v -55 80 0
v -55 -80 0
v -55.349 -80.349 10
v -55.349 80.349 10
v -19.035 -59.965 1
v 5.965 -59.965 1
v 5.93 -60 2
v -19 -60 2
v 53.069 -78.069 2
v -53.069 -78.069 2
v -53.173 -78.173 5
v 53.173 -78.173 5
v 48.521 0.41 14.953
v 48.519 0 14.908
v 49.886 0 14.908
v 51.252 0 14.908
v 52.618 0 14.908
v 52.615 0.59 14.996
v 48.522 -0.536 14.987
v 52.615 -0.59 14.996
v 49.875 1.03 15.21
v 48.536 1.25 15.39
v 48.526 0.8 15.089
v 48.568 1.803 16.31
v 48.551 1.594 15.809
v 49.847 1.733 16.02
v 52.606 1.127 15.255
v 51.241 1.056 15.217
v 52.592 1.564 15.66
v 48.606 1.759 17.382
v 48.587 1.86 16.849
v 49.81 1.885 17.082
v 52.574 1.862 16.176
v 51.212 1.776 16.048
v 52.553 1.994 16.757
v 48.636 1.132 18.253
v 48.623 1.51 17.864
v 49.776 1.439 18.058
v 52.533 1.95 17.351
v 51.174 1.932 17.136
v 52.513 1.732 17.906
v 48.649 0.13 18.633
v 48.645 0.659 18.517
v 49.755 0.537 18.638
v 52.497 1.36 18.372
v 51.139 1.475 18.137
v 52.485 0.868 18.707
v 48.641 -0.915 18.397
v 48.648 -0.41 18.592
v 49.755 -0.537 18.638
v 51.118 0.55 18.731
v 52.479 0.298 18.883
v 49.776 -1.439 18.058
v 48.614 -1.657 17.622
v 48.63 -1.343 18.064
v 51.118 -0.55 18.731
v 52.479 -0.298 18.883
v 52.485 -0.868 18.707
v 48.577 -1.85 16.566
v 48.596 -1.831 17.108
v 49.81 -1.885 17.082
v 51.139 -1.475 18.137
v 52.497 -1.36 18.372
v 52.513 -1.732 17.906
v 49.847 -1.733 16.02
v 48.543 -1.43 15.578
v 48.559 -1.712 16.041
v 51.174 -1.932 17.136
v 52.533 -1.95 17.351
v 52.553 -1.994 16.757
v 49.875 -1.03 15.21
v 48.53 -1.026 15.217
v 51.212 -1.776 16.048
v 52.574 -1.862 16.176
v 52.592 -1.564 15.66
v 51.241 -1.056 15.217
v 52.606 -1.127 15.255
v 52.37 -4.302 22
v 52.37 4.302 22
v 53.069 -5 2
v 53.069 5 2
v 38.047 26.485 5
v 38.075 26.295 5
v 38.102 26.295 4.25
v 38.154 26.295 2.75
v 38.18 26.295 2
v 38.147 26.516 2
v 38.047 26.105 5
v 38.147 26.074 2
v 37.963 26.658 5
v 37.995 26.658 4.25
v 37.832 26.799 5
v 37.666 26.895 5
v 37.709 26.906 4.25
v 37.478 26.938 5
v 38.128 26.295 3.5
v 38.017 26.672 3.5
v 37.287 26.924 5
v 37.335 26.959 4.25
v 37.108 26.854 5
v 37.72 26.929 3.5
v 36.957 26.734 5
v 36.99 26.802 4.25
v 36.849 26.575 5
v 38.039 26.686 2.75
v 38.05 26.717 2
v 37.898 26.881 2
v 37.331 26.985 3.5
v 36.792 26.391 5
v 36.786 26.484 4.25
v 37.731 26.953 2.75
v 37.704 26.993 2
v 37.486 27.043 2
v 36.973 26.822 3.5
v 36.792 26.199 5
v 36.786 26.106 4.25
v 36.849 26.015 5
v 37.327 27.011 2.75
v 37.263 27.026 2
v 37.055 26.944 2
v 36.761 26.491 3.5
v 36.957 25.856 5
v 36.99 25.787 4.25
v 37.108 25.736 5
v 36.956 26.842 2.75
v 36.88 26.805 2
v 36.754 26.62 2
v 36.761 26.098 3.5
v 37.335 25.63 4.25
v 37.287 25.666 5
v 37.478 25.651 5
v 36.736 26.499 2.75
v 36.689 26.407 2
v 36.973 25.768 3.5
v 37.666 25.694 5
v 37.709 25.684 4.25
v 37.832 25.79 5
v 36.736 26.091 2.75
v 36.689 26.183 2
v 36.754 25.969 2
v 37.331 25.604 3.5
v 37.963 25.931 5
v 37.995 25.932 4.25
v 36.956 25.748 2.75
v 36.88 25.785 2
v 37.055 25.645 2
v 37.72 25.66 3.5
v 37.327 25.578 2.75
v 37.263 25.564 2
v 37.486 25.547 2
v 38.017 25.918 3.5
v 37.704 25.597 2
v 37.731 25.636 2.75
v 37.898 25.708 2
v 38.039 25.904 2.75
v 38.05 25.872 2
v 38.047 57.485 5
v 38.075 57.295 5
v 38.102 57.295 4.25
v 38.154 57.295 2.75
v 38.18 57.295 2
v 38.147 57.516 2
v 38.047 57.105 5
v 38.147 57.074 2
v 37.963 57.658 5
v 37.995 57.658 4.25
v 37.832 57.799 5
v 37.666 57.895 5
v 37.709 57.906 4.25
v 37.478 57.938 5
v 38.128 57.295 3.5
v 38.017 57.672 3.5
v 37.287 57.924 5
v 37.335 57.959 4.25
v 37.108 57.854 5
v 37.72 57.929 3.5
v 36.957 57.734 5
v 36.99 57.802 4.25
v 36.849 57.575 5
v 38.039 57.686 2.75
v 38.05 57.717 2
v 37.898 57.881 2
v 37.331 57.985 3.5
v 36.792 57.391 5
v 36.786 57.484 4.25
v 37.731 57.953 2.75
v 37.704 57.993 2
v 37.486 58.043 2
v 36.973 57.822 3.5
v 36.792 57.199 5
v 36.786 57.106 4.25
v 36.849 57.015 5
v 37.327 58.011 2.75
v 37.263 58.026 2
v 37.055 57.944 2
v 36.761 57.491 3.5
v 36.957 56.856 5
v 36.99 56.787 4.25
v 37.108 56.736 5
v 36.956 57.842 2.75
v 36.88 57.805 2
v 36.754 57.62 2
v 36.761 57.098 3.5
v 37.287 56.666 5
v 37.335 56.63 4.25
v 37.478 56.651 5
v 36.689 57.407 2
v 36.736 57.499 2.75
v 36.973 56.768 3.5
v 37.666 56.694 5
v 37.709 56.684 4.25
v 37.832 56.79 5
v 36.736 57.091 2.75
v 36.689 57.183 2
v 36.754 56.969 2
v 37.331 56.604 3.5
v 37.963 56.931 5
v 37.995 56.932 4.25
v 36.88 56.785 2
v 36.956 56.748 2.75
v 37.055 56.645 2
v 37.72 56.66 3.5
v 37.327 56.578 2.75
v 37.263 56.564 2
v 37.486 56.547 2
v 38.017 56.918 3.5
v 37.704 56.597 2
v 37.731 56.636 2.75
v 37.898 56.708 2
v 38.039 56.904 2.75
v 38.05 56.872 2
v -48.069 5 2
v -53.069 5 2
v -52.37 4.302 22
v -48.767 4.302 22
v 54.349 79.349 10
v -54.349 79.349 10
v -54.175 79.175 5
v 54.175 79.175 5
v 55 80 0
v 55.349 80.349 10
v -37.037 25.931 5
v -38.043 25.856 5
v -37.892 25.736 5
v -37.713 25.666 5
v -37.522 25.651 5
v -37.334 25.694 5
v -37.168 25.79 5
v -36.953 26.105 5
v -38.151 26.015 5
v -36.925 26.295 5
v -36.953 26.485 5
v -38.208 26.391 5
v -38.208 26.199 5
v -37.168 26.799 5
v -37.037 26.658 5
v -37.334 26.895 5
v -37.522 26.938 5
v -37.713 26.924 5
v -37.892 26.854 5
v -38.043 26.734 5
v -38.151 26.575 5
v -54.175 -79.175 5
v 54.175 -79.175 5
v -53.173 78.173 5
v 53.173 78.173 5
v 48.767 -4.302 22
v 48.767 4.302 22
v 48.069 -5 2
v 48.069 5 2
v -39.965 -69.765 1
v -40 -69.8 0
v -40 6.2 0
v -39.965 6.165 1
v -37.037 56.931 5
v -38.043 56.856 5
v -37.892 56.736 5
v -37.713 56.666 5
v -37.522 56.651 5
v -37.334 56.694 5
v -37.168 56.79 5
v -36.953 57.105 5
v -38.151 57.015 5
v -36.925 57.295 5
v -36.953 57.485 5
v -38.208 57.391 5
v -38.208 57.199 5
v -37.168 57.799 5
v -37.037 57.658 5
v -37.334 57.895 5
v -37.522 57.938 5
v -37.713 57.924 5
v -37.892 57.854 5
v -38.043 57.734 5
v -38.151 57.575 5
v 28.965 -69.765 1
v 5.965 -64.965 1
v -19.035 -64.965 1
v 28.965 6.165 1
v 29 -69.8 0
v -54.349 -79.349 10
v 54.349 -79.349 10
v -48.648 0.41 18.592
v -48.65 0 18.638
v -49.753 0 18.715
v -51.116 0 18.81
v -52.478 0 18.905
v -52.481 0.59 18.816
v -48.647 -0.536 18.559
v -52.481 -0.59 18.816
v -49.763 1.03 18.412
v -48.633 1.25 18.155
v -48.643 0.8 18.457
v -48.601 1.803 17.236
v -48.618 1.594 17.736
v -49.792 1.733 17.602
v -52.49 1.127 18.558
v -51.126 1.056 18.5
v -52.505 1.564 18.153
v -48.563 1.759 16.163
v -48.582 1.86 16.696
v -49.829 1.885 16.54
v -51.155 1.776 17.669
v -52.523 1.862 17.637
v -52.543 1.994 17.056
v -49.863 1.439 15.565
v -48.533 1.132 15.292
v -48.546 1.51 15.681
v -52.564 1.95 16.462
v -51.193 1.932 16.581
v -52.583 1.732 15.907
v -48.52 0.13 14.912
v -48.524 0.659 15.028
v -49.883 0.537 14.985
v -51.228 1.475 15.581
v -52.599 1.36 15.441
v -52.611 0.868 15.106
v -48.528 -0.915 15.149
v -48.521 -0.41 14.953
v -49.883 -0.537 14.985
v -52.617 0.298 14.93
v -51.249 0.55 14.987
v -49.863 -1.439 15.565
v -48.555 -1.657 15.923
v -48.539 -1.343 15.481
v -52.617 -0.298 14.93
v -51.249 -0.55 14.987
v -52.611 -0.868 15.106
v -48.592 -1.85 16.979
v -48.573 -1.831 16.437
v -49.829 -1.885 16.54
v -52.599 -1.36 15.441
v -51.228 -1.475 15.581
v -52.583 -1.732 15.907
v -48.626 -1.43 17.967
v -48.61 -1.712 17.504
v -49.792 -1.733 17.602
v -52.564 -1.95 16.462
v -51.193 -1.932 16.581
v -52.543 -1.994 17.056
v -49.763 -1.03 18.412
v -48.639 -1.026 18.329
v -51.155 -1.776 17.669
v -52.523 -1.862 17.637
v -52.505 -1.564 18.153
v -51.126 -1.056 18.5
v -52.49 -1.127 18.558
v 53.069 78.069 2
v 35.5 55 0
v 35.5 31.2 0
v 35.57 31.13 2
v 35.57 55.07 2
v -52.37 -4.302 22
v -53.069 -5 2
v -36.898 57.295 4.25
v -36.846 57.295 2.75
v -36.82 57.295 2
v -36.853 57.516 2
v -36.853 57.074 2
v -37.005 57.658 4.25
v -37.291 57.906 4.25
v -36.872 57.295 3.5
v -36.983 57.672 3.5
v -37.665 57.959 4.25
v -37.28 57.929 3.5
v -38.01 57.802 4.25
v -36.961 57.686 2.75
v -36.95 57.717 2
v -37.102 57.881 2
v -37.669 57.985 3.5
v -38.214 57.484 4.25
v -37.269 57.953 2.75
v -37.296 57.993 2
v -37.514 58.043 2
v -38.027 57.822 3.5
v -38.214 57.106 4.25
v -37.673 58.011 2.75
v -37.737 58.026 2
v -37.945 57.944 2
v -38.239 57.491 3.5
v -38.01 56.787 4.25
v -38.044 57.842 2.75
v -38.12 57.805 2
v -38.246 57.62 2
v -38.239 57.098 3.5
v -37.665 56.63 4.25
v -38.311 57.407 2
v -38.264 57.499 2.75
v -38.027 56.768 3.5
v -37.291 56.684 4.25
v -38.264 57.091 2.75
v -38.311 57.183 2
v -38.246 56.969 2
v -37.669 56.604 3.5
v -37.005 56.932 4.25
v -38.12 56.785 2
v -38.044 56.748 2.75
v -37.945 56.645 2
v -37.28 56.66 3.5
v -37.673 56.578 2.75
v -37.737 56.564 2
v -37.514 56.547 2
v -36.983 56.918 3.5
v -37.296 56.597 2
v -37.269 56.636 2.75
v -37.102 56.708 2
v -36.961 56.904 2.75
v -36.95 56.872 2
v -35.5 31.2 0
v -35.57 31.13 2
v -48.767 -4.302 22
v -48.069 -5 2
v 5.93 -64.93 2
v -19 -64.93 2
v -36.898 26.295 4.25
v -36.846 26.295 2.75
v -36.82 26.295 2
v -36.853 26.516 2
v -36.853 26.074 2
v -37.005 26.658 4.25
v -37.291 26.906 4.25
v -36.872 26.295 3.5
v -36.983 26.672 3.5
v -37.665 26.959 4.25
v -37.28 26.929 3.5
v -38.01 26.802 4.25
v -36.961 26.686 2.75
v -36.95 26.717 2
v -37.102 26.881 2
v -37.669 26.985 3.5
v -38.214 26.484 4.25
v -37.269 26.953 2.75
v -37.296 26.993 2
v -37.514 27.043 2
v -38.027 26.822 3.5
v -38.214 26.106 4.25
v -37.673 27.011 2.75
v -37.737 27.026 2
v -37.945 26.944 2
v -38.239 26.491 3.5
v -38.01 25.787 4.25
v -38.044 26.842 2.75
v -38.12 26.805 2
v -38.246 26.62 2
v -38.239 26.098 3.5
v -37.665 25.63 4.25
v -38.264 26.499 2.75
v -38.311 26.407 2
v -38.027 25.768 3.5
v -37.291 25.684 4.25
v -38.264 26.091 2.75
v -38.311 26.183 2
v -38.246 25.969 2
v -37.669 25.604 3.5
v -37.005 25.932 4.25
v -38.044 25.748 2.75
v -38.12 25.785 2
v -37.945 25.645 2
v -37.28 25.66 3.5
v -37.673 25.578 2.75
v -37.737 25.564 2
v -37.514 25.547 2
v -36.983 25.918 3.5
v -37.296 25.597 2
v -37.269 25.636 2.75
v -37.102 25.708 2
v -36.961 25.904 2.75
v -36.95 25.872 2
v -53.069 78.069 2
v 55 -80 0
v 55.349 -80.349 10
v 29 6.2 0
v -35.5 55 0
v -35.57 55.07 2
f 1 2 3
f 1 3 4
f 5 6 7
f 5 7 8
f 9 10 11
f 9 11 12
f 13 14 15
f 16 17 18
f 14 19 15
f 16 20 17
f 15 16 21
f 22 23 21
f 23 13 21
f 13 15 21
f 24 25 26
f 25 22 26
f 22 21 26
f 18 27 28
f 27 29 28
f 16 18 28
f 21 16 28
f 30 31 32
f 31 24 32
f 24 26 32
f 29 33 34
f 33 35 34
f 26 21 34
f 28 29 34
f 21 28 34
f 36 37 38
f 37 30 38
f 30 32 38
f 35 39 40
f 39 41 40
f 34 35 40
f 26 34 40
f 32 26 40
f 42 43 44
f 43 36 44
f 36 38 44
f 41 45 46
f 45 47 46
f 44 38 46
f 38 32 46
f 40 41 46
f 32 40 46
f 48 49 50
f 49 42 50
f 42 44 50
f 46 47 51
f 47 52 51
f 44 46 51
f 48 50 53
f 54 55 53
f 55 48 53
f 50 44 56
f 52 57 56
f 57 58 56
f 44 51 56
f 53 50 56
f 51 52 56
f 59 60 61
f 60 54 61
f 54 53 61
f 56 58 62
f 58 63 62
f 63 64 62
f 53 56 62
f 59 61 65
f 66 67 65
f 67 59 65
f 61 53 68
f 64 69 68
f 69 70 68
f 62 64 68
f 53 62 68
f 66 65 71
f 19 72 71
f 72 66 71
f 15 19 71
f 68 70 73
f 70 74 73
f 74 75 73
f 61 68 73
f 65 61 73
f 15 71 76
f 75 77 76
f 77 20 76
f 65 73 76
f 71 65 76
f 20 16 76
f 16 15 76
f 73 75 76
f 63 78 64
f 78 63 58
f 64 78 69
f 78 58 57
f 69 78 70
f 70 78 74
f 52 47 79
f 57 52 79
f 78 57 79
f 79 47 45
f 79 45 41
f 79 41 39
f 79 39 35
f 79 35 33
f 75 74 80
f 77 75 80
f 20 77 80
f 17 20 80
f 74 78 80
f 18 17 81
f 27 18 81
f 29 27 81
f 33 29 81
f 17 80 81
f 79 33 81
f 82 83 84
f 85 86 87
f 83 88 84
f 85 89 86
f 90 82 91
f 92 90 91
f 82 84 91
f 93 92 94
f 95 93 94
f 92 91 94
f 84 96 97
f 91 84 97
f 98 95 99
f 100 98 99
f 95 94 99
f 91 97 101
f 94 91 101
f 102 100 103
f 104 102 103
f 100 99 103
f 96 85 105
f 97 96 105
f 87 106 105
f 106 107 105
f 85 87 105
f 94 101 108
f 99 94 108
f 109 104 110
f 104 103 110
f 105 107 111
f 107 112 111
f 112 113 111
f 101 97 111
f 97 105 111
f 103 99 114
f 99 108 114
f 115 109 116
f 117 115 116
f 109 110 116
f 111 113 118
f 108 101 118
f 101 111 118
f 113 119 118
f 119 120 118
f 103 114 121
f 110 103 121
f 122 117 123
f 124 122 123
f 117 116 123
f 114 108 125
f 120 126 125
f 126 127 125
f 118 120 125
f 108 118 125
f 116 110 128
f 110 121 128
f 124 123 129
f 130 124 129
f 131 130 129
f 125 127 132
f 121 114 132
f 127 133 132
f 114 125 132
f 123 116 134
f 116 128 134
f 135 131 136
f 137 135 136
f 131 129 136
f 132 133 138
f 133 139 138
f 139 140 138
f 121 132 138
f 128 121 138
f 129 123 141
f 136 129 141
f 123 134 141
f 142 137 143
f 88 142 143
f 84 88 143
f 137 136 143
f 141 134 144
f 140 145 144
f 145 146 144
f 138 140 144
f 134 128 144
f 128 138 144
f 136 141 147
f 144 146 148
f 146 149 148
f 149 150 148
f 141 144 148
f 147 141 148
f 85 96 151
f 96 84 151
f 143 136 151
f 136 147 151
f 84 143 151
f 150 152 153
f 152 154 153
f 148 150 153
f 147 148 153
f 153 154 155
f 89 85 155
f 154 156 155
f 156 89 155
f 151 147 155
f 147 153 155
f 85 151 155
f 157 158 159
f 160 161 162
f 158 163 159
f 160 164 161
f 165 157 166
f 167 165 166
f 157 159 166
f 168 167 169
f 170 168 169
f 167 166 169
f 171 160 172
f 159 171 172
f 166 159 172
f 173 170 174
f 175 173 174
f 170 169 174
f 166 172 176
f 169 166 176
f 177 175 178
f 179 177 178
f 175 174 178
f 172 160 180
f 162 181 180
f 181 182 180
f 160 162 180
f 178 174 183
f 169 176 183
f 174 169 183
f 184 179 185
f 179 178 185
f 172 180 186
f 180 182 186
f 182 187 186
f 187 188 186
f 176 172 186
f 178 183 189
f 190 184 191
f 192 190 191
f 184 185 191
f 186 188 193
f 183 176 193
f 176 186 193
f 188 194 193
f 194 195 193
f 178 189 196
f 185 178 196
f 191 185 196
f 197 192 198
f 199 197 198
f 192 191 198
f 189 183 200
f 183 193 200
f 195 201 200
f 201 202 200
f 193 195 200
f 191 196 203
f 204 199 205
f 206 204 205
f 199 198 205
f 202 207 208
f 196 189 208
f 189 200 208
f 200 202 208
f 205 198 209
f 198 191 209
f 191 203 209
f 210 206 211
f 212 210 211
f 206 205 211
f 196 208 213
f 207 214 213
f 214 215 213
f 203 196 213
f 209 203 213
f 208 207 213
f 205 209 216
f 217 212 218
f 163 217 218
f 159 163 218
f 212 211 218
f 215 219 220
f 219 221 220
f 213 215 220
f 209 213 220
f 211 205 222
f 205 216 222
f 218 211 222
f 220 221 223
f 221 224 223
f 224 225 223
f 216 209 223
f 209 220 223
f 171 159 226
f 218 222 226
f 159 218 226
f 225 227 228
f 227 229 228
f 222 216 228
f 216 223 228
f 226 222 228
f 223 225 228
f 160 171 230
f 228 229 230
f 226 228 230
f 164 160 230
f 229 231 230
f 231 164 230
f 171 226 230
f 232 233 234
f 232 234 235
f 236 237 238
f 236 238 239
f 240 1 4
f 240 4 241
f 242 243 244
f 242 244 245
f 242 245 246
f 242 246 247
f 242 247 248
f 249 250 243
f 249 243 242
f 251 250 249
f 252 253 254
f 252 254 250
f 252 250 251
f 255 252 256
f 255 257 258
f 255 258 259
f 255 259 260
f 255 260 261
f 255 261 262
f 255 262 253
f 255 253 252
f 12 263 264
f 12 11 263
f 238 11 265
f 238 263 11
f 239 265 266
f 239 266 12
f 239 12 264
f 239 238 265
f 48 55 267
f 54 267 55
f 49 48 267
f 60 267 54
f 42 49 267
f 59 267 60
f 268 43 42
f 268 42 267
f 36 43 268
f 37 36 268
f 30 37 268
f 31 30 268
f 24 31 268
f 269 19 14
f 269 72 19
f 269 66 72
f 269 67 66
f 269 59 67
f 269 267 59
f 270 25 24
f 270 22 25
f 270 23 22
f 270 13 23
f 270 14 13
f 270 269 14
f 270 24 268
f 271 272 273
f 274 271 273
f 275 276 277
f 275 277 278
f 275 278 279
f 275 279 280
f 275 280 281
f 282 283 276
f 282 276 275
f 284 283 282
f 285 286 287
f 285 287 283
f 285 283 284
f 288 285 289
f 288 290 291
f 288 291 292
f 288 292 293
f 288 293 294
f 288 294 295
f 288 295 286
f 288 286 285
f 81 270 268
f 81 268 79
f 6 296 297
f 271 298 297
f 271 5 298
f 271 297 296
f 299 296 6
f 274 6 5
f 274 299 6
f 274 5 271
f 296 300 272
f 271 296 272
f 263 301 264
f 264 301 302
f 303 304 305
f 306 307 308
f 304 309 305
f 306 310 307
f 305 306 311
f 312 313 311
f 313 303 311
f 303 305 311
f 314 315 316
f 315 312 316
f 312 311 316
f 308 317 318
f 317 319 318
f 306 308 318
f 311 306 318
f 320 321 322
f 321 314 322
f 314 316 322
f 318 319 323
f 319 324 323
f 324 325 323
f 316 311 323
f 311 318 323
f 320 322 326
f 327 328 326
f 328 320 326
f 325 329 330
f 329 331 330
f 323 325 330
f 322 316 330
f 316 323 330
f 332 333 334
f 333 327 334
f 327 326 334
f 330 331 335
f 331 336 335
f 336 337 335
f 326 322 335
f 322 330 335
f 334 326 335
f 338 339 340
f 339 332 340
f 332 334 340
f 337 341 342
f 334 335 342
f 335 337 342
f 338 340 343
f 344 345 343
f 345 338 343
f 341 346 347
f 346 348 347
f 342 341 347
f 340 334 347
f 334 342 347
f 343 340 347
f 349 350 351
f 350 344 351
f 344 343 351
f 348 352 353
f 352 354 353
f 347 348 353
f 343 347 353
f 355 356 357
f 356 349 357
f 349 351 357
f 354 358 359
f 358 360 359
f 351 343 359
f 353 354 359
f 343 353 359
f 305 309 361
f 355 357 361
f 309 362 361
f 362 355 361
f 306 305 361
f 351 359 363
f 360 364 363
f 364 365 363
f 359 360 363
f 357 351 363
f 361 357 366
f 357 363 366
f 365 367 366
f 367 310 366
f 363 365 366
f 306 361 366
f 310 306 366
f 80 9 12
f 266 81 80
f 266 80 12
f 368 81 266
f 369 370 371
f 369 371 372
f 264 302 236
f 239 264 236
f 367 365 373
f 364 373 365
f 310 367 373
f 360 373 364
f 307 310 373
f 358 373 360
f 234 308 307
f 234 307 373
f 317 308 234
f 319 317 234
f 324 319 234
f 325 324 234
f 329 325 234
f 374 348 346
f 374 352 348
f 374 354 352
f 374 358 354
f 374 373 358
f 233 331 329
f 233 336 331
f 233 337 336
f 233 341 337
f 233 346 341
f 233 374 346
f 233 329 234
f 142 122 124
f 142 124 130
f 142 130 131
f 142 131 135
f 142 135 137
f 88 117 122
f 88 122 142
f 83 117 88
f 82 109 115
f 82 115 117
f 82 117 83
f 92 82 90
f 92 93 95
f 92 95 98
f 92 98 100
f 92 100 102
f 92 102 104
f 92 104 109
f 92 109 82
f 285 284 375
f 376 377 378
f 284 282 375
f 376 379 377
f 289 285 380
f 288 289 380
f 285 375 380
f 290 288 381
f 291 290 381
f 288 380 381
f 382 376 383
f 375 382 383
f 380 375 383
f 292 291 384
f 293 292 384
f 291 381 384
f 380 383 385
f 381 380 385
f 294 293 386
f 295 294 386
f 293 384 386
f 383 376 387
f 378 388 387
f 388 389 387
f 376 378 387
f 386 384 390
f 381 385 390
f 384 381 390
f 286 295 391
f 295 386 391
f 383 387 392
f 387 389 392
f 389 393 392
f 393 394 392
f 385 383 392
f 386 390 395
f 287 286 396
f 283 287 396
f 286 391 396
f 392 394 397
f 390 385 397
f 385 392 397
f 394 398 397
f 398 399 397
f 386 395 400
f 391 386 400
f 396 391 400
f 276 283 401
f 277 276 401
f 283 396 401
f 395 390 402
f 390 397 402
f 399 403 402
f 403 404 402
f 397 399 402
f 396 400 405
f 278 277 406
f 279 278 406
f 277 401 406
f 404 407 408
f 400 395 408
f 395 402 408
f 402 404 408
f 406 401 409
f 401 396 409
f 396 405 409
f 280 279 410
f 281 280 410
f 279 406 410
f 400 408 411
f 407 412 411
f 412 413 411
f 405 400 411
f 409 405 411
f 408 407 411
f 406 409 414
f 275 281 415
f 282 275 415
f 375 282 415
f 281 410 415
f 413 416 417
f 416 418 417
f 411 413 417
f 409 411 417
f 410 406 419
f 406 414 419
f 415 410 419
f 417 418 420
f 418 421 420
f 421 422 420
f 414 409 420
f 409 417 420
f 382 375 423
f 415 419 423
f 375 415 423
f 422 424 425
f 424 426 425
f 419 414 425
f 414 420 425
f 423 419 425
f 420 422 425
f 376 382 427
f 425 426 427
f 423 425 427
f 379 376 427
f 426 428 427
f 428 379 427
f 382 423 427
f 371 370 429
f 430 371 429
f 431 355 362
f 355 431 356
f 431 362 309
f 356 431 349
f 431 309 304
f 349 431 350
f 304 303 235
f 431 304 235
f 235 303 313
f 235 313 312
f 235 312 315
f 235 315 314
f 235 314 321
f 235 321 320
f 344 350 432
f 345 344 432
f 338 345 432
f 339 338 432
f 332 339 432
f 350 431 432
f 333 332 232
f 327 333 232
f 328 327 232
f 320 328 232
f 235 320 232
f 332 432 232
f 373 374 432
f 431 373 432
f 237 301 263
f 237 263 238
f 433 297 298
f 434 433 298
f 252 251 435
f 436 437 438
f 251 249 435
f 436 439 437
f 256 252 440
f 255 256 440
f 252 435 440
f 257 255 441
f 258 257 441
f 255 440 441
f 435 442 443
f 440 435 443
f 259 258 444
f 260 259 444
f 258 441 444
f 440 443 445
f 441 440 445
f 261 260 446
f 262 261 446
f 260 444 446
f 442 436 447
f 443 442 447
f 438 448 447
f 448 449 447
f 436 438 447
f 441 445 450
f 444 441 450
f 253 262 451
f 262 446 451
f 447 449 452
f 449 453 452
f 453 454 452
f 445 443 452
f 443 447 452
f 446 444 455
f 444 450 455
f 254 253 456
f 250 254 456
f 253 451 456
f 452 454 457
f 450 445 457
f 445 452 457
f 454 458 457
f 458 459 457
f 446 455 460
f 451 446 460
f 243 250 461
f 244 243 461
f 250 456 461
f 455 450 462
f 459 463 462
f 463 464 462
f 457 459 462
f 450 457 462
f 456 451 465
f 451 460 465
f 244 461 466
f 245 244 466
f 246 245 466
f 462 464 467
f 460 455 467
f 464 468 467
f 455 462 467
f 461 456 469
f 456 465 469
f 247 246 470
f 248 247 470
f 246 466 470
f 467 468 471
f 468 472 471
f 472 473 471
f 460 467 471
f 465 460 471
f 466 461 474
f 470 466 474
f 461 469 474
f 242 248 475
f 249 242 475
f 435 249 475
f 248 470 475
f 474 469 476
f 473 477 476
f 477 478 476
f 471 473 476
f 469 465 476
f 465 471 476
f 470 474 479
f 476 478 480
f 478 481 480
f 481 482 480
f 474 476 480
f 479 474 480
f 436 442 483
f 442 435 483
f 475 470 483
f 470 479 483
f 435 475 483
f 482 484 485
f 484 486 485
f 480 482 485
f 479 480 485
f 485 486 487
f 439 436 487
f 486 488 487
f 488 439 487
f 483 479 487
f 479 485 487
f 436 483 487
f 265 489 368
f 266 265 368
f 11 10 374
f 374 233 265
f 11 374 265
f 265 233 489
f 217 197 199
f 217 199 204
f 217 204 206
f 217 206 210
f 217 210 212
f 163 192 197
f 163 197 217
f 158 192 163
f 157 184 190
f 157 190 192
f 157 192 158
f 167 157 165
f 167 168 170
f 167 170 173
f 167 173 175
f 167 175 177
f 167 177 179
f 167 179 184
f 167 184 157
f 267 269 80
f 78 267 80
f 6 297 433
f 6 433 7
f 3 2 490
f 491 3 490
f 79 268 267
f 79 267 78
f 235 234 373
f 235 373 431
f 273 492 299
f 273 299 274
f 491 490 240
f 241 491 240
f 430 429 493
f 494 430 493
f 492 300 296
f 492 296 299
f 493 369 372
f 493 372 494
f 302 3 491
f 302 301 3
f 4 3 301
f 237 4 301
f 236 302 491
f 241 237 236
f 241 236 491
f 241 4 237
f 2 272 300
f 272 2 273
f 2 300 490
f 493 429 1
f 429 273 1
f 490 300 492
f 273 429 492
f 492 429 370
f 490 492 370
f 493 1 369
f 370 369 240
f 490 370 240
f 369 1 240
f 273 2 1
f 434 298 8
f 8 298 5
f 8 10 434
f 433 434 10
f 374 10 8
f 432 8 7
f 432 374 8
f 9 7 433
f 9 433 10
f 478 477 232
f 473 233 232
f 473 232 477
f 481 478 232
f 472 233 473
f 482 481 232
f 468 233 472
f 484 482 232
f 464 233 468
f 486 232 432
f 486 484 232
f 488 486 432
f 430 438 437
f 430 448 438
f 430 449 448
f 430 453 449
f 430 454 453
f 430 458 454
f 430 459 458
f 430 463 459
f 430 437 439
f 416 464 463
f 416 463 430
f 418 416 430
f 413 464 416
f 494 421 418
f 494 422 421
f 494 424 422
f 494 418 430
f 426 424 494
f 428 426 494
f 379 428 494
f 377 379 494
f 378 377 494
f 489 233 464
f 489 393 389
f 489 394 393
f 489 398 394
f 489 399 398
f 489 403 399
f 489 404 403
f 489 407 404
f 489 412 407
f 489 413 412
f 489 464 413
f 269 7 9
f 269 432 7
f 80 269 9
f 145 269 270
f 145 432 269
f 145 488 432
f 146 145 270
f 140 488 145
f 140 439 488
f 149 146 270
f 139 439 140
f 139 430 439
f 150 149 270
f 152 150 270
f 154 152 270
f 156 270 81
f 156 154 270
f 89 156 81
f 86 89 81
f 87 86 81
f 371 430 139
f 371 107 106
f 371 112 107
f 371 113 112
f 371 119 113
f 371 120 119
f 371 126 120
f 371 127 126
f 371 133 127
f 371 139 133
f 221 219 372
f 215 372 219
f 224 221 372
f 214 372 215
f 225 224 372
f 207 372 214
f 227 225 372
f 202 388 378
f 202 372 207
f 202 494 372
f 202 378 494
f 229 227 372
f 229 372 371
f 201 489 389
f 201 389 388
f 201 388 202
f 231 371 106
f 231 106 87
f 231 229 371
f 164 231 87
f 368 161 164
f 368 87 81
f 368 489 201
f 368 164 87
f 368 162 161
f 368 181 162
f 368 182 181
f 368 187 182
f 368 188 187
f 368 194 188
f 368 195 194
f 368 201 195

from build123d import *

# Parameters (mm, degrees)
SKETCH1_W                     = 110
SKETCH1_H                     = 160
BOSS_EXTRUDE1_DEPTH           = 10
BOSS_EXTRUDE1_DRAFT           = -2
SHELL1_T                      = -2
SKETCH3_W                     = 108.69841539
SKETCH3_H                     = 158.69841539
CUT_EXTRUDE3_DEPTH            = 5
CUT_EXTRUDE3_DRAFT            = -2
SKETCH4_W                     = 71
SKETCH4_H                     = 23.8
CUT_EXTRUDE4_DEPTH            = 2
CUT_EXTRUDE4_DRAFT            = 2
SKETCH10_R                    = 0.75
BOSS_EXTRUDE3_DEPTH           = 3
BOSS_EXTRUDE3_DRAFT           = 2
BOSS_EXTRUDE3_PROFILE_2_DEPTH = 3
BOSS_EXTRUDE3_PROFILE_2_DRAFT = 2
BOSS_EXTRUDE3_PROFILE_3_DEPTH = 3
BOSS_EXTRUDE3_PROFILE_3_DRAFT = 2
BOSS_EXTRUDE3_PROFILE_4_DEPTH = 3
BOSS_EXTRUDE3_PROFILE_4_DRAFT = 2
SKETCH13_W                    = 5
SKETCH13_H                    = 10
BOSS_EXTRUDE8_DEPTH           = 20
BOSS_EXTRUDE8_DRAFT           = 2
BOSS_EXTRUDE8_PROFILE_2_DEPTH = 20
BOSS_EXTRUDE8_PROFILE_2_DRAFT = 2
CUT_EXTRUDE8_REACH            = 138.446
SKETCH21_R                    = 2
CUT_EXTRUDE8_DRAFT            = -2
CUT_EXTRUDE9_REACH            = 138.446
SKETCH22_R                    = 2
CUT_EXTRUDE9_DRAFT            = -2
SKETCH27_W                    = 69
SKETCH27_H                    = 76
CUT_EXTRUDE10_DEPTH           = 1
CUT_EXTRUDE10_DRAFT           = -2
SKETCH28_W                    = 25
SKETCH28_H                    = 5
CUT_EXTRUDE11_DEPTH           = 1
CUT_EXTRUDE11_DRAFT           = -2


with BuildPart() as part:
    # Sketch1 → Boss-Extrude1 (with draft: the straight prism first)
    with BuildSketch(Plane.XY):
        Rectangle(SKETCH1_W, SKETCH1_H)
    extrude(amount=BOSS_EXTRUDE1_DEPTH)
    # Boss-Extrude1: the draft: its side faces are tilted about the plane it starts from
    boss_extrude1_sides = [part.faces().sort_by_distance(p)[0] for p in [
        (55, 0, 5),
        (0, 80, 5),
        (-55, 0, 5),
        (0, -80, 5),
    ]]
    draft(boss_extrude1_sides, Plane.XY, BOSS_EXTRUDE1_DRAFT)

    # Shell1
    shell1_openings = [part.faces().sort_by_distance(p)[0] for p in [
        (0, 0, 10),
    ]]
    offset(amount=SHELL1_T, openings=shell1_openings, kind=Kind.INTERSECTION)


with BuildPart() as cut_extrude3_tool:
    # Sketch3 → Cut-Extrude3 (with draft: the straight prism first)
    with BuildSketch(Plane.XY.offset(10)):
        Rectangle(SKETCH3_W, SKETCH3_H)
    extrude(amount=-CUT_EXTRUDE3_DEPTH)
    # Cut-Extrude3: the draft: its side faces are tilted about the plane it starts from
    cut_extrude3_sides = [cut_extrude3_tool.faces().sort_by_distance(p)[0] for p in [
        (54.349207695, 0, 7.5),
        (0, 79.349207695, 7.5),
        (-54.349207695, 0, 7.5),
        (0, -79.349207695, 7.5),
    ]]
    draft(cut_extrude3_sides, Plane.XY.offset(10), CUT_EXTRUDE3_DRAFT)


with BuildPart() as part_1:
    add(part.part)

    # Cut-Extrude3: cut by cut_extrude3_tool
    add(cut_extrude3_tool.part, mode=Mode.SUBTRACT)


with BuildPart() as cut_extrude4_tool:
    # Sketch4 → Cut-Extrude4 (with draft: the straight prism first)
    with BuildSketch(Plane(origin=(0, 0, 0), x_dir=(-1, 0, 0), z_dir=(0, 0, -1))):
        with Locations((0, 43.1)):
            Rectangle(SKETCH4_W, SKETCH4_H)
    extrude(amount=-CUT_EXTRUDE4_DEPTH)
    # Cut-Extrude4: the draft: its side faces are tilted about the plane it starts from
    cut_extrude4_sides = [cut_extrude4_tool.faces().sort_by_distance(p)[0] for p in [
        (-35.5, 43.1, 1),
        (0, 55, 1),
        (35.5, 43.1, 1),
        (0, 31.2, 1),
    ]]
    draft(cut_extrude4_sides, Plane(origin=(0, 0, 0), x_dir=(-1, 0, 0), z_dir=(0, 0, -1)), CUT_EXTRUDE4_DRAFT)


with BuildPart() as part_2:
    add(part_1.part)

    # Cut-Extrude4: cut by cut_extrude4_tool
    add(cut_extrude4_tool.part, mode=Mode.SUBTRACT)


with BuildPart() as boss_extrude3_tool:
    # Sketch10 → Boss-Extrude3 (with draft: the straight prism first)
    with BuildSketch(Plane.XY.offset(2)):
        with Locations((-37.569841539, 57.294841539)):
            Circle(SKETCH10_R)
    extrude(amount=BOSS_EXTRUDE3_DEPTH)
    # Boss-Extrude3: the draft: its side faces are tilted about the plane it starts from
    boss_extrude3_sides = [boss_extrude3_tool.faces().sort_by_distance(p)[0] for p in [
        (-38.319841539, 57.294841539, 3.5),
    ]]
    draft(boss_extrude3_sides, Plane.XY.offset(2), BOSS_EXTRUDE3_DRAFT)


with BuildPart() as part_3:
    add(part_2.part)

    # Boss-Extrude3: add boss_extrude3_tool
    add(boss_extrude3_tool.part)


with BuildPart() as boss_extrude3_profile_2_tool:
    # Sketch10 → Boss-Extrude3 profile 2 (with draft: the straight prism first)
    with BuildSketch(Plane.XY.offset(2)):
        with Locations((37.430158461, 57.294841539)):
            Circle(SKETCH10_R)
    extrude(amount=BOSS_EXTRUDE3_PROFILE_2_DEPTH)
    # Boss-Extrude3 profile 2: the draft: its side faces are tilted about the plane it starts from
    boss_extrude3_profile_2_sides = [boss_extrude3_profile_2_tool.faces().sort_by_distance(p)[0] for p in [
        (36.680158461, 57.294841539, 3.5),
    ]]
    draft(boss_extrude3_profile_2_sides, Plane.XY.offset(2), BOSS_EXTRUDE3_PROFILE_2_DRAFT)


with BuildPart() as part_4:
    add(part_3.part)

    # Boss-Extrude3 profile 2: add boss_extrude3_profile_2_tool
    add(boss_extrude3_profile_2_tool.part)


with BuildPart() as boss_extrude3_profile_3_tool:
    # Sketch10 → Boss-Extrude3 profile 3 (with draft: the straight prism first)
    with BuildSketch(Plane.XY.offset(2)):
        with Locations((37.430158461, 26.294841539)):
            Circle(SKETCH10_R)
    extrude(amount=BOSS_EXTRUDE3_PROFILE_3_DEPTH)
    # Boss-Extrude3 profile 3: the draft: its side faces are tilted about the plane it starts from
    boss_extrude3_profile_3_sides = [boss_extrude3_profile_3_tool.faces().sort_by_distance(p)[0] for p in [
        (36.680158461, 26.294841539, 3.5),
    ]]
    draft(boss_extrude3_profile_3_sides, Plane.XY.offset(2), BOSS_EXTRUDE3_PROFILE_3_DRAFT)


with BuildPart() as part_5:
    add(part_4.part)

    # Boss-Extrude3 profile 3: add boss_extrude3_profile_3_tool
    add(boss_extrude3_profile_3_tool.part)


with BuildPart() as boss_extrude3_profile_4_tool:
    # Sketch10 → Boss-Extrude3 profile 4 (with draft: the straight prism first)
    with BuildSketch(Plane.XY.offset(2)):
        with Locations((-37.569841539, 26.294841539)):
            Circle(SKETCH10_R)
    extrude(amount=BOSS_EXTRUDE3_PROFILE_4_DEPTH)
    # Boss-Extrude3 profile 4: the draft: its side faces are tilted about the plane it starts from
    boss_extrude3_profile_4_sides = [boss_extrude3_profile_4_tool.faces().sort_by_distance(p)[0] for p in [
        (-38.319841539, 26.294841539, 3.5),
    ]]
    draft(boss_extrude3_profile_4_sides, Plane.XY.offset(2), BOSS_EXTRUDE3_PROFILE_4_DRAFT)


with BuildPart() as part_6:
    add(part_5.part)

    # Boss-Extrude3 profile 4: add boss_extrude3_profile_4_tool
    add(boss_extrude3_profile_4_tool.part)


with BuildPart() as boss_extrude8_tool:
    # Sketch13 → Boss-Extrude8 (with draft: the straight prism first)
    with BuildSketch(Plane.XY.offset(2)):
        with Locations((-50.56862245, 0)):
            Rectangle(SKETCH13_W, SKETCH13_H)
    extrude(amount=BOSS_EXTRUDE8_DEPTH)
    # Boss-Extrude8: the draft: its side faces are tilted about the plane it starts from
    boss_extrude8_sides = [boss_extrude8_tool.faces().sort_by_distance(p)[0] for p in [
        (-50.56862245, 5, 12),
        (-53.06862245, 0, 12),
        (-50.56862245, -5, 12),
        (-48.06862245, 0, 12),
    ]]
    draft(boss_extrude8_sides, Plane.XY.offset(2), BOSS_EXTRUDE8_DRAFT)


with BuildPart() as part_7:
    add(part_6.part)

    # Boss-Extrude8: add boss_extrude8_tool
    add(boss_extrude8_tool.part)


with BuildPart() as boss_extrude8_profile_2_tool:
    # Sketch13 → Boss-Extrude8 profile 2 (with draft: the straight prism first)
    with BuildSketch(Plane.XY.offset(2)):
        with Locations((50.56862245, 0)):
            Rectangle(SKETCH13_W, SKETCH13_H)
    extrude(amount=BOSS_EXTRUDE8_PROFILE_2_DEPTH)
    # Boss-Extrude8 profile 2: the draft: its side faces are tilted about the plane it starts from
    boss_extrude8_profile_2_sides = [boss_extrude8_profile_2_tool.faces().sort_by_distance(p)[0] for p in [
        (50.56862245, -5, 12),
        (53.06862245, 0, 12),
        (50.56862245, 5, 12),
        (48.06862245, 0, 12),
    ]]
    draft(boss_extrude8_profile_2_sides, Plane.XY.offset(2), BOSS_EXTRUDE8_PROFILE_2_DRAFT)


with BuildPart() as part_8:
    add(part_7.part)

    # Boss-Extrude8 profile 2: add boss_extrude8_profile_2_tool
    add(boss_extrude8_profile_2_tool.part)

    # Cut-Extrude8: up to this plane
    cut_extrude8_end = Plane(origin=(-48.06862245, 5, 2), z_dir=(0.9993908270190958, 0, 0.034899496702501004))



with BuildPart() as cut_extrude8_long_prism_1:
    # Sketch21 → Cut-Extrude8 (the long prism of profile 1, to be tilted and cut off)
    with BuildSketch(Plane(origin=(-53.073742676, 0, 1.853375934), x_dir=(0.03489949670250101, 0, 0.9993908270190958), z_dir=(-0.9993908270190958, 0, 0.03489949670250101))):
        with Locations((15.062248779, 0)):
            Circle(SKETCH21_R)
    extrude(amount=-CUT_EXTRUDE8_REACH)
    cut_extrude8_tool1_sides = [cut_extrude8_long_prism_1.faces().sort_by_distance(p)[0] for p in [
        (16.562954451, 0, 12.491819684),
    ]]
    draft(cut_extrude8_tool1_sides, Plane(origin=(-53.073742676, 0, 1.853375934), x_dir=(0.03489949670250101, 0, 0.9993908270190958), z_dir=(-0.9993908270190958, 0, 0.03489949670250101)), CUT_EXTRUDE8_DRAFT)  # the draft: side faces tilted about the start plane


with BuildPart() as part_9:
    add(part_8.part)
    cut_extrude8_tool1 = split(cut_extrude8_long_prism_1.part, bisect_by=cut_extrude8_end, keep=Keep.BOTH, mode=Mode.PRIVATE)
    add(cut_extrude8_tool1.solids().sort_by_distance((-52.548078, 0, 16.906449))[0], mode=Mode.SUBTRACT)

    # Cut-Extrude9: up to this plane
    cut_extrude9_end = Plane(origin=(48.06862245, -5, 2), z_dir=(-0.9993908270190958, 0, 0.034899496702501004))



with BuildPart() as cut_extrude9_long_prism_1:
    # Sketch22 → Cut-Extrude9 (the long prism of profile 1, to be tilted and cut off)
    with BuildSketch(Plane(origin=(53.073742676, 0, 1.853375934), x_dir=(0.03489949670250101, 0, -0.9993908270190958), z_dir=(0.9993908270190958, 0, 0.03489949670250101))):
        with Locations((-15.062248779, 0)):
            Circle(SKETCH22_R)
    extrude(amount=-CUT_EXTRUDE9_REACH)
    cut_extrude9_tool1_sides = [cut_extrude9_long_prism_1.faces().sort_by_distance(p)[0] for p in [
        (-16.702552438, 0, 16.489382992),
    ]]
    draft(cut_extrude9_tool1_sides, Plane(origin=(53.073742676, 0, 1.853375934), x_dir=(0.03489949670250101, 0, -0.9993908270190958), z_dir=(0.9993908270190958, 0, 0.03489949670250101)), CUT_EXTRUDE9_DRAFT)  # the draft: side faces tilted about the start plane


with BuildPart() as part_10:
    add(part_9.part)
    cut_extrude9_tool1 = split(cut_extrude9_long_prism_1.part, bisect_by=cut_extrude9_end, keep=Keep.BOTH, mode=Mode.PRIVATE)
    add(cut_extrude9_tool1.solids().sort_by_distance((52.548078, 0, 16.906449))[0], mode=Mode.SUBTRACT)


with BuildPart() as cut_extrude10_tool:
    # Sketch27 → Cut-Extrude10 (with draft: the straight prism first)
    with BuildSketch(Plane(origin=(0, 0, 0), x_dir=(-1, 0, 0), z_dir=(0, 0, -1))):
        with Locations((5.5, -31.8)):
            Rectangle(SKETCH27_W, SKETCH27_H)
    extrude(amount=-CUT_EXTRUDE10_DEPTH)
    # Cut-Extrude10: the draft: its side faces are tilted about the plane it starts from
    cut_extrude10_sides = [cut_extrude10_tool.faces().sort_by_distance(p)[0] for p in [
        (-40, -31.8, 0.5),
        (-5.5, 6.2, 0.5),
        (29, -31.8, 0.5),
        (-5.5, -69.8, 0.5),
    ]]
    draft(cut_extrude10_sides, Plane(origin=(0, 0, 0), x_dir=(-1, 0, 0), z_dir=(0, 0, -1)), CUT_EXTRUDE10_DRAFT)


with BuildPart() as part_11:
    add(part_10.part)

    # Cut-Extrude10: cut by cut_extrude10_tool
    add(cut_extrude10_tool.part, mode=Mode.SUBTRACT)


with BuildPart() as cut_extrude11_tool:
    # Sketch28 → Cut-Extrude11 (with draft: the straight prism first)
    with BuildSketch(Plane(origin=(0, 0, 1), x_dir=(-1, 0, 0), z_dir=(0, 0, -1))):
        with Locations((6.534920769, -62.465079231)):
            Rectangle(SKETCH28_W, SKETCH28_H)
    extrude(amount=-CUT_EXTRUDE11_DEPTH)
    # Cut-Extrude11: the draft: its side faces are tilted about the plane it starts from
    cut_extrude11_sides = [cut_extrude11_tool.faces().sort_by_distance(p)[0] for p in [
        (-6.534920769, -59.965079231, 1.5),
        (5.965079231, -62.465079231, 1.5),
        (-6.534920769, -64.965079231, 1.5),
        (-19.034920769, -62.465079231, 1.5),
    ]]
    draft(cut_extrude11_sides, Plane(origin=(0, 0, 1), x_dir=(-1, 0, 0), z_dir=(0, 0, -1)), CUT_EXTRUDE11_DRAFT)


with BuildPart() as part_12:
    add(part_11.part)

    # Cut-Extrude11: cut by cut_extrude11_tool
    add(cut_extrude11_tool.part, mode=Mode.SUBTRACT)


solid = part_12.part
